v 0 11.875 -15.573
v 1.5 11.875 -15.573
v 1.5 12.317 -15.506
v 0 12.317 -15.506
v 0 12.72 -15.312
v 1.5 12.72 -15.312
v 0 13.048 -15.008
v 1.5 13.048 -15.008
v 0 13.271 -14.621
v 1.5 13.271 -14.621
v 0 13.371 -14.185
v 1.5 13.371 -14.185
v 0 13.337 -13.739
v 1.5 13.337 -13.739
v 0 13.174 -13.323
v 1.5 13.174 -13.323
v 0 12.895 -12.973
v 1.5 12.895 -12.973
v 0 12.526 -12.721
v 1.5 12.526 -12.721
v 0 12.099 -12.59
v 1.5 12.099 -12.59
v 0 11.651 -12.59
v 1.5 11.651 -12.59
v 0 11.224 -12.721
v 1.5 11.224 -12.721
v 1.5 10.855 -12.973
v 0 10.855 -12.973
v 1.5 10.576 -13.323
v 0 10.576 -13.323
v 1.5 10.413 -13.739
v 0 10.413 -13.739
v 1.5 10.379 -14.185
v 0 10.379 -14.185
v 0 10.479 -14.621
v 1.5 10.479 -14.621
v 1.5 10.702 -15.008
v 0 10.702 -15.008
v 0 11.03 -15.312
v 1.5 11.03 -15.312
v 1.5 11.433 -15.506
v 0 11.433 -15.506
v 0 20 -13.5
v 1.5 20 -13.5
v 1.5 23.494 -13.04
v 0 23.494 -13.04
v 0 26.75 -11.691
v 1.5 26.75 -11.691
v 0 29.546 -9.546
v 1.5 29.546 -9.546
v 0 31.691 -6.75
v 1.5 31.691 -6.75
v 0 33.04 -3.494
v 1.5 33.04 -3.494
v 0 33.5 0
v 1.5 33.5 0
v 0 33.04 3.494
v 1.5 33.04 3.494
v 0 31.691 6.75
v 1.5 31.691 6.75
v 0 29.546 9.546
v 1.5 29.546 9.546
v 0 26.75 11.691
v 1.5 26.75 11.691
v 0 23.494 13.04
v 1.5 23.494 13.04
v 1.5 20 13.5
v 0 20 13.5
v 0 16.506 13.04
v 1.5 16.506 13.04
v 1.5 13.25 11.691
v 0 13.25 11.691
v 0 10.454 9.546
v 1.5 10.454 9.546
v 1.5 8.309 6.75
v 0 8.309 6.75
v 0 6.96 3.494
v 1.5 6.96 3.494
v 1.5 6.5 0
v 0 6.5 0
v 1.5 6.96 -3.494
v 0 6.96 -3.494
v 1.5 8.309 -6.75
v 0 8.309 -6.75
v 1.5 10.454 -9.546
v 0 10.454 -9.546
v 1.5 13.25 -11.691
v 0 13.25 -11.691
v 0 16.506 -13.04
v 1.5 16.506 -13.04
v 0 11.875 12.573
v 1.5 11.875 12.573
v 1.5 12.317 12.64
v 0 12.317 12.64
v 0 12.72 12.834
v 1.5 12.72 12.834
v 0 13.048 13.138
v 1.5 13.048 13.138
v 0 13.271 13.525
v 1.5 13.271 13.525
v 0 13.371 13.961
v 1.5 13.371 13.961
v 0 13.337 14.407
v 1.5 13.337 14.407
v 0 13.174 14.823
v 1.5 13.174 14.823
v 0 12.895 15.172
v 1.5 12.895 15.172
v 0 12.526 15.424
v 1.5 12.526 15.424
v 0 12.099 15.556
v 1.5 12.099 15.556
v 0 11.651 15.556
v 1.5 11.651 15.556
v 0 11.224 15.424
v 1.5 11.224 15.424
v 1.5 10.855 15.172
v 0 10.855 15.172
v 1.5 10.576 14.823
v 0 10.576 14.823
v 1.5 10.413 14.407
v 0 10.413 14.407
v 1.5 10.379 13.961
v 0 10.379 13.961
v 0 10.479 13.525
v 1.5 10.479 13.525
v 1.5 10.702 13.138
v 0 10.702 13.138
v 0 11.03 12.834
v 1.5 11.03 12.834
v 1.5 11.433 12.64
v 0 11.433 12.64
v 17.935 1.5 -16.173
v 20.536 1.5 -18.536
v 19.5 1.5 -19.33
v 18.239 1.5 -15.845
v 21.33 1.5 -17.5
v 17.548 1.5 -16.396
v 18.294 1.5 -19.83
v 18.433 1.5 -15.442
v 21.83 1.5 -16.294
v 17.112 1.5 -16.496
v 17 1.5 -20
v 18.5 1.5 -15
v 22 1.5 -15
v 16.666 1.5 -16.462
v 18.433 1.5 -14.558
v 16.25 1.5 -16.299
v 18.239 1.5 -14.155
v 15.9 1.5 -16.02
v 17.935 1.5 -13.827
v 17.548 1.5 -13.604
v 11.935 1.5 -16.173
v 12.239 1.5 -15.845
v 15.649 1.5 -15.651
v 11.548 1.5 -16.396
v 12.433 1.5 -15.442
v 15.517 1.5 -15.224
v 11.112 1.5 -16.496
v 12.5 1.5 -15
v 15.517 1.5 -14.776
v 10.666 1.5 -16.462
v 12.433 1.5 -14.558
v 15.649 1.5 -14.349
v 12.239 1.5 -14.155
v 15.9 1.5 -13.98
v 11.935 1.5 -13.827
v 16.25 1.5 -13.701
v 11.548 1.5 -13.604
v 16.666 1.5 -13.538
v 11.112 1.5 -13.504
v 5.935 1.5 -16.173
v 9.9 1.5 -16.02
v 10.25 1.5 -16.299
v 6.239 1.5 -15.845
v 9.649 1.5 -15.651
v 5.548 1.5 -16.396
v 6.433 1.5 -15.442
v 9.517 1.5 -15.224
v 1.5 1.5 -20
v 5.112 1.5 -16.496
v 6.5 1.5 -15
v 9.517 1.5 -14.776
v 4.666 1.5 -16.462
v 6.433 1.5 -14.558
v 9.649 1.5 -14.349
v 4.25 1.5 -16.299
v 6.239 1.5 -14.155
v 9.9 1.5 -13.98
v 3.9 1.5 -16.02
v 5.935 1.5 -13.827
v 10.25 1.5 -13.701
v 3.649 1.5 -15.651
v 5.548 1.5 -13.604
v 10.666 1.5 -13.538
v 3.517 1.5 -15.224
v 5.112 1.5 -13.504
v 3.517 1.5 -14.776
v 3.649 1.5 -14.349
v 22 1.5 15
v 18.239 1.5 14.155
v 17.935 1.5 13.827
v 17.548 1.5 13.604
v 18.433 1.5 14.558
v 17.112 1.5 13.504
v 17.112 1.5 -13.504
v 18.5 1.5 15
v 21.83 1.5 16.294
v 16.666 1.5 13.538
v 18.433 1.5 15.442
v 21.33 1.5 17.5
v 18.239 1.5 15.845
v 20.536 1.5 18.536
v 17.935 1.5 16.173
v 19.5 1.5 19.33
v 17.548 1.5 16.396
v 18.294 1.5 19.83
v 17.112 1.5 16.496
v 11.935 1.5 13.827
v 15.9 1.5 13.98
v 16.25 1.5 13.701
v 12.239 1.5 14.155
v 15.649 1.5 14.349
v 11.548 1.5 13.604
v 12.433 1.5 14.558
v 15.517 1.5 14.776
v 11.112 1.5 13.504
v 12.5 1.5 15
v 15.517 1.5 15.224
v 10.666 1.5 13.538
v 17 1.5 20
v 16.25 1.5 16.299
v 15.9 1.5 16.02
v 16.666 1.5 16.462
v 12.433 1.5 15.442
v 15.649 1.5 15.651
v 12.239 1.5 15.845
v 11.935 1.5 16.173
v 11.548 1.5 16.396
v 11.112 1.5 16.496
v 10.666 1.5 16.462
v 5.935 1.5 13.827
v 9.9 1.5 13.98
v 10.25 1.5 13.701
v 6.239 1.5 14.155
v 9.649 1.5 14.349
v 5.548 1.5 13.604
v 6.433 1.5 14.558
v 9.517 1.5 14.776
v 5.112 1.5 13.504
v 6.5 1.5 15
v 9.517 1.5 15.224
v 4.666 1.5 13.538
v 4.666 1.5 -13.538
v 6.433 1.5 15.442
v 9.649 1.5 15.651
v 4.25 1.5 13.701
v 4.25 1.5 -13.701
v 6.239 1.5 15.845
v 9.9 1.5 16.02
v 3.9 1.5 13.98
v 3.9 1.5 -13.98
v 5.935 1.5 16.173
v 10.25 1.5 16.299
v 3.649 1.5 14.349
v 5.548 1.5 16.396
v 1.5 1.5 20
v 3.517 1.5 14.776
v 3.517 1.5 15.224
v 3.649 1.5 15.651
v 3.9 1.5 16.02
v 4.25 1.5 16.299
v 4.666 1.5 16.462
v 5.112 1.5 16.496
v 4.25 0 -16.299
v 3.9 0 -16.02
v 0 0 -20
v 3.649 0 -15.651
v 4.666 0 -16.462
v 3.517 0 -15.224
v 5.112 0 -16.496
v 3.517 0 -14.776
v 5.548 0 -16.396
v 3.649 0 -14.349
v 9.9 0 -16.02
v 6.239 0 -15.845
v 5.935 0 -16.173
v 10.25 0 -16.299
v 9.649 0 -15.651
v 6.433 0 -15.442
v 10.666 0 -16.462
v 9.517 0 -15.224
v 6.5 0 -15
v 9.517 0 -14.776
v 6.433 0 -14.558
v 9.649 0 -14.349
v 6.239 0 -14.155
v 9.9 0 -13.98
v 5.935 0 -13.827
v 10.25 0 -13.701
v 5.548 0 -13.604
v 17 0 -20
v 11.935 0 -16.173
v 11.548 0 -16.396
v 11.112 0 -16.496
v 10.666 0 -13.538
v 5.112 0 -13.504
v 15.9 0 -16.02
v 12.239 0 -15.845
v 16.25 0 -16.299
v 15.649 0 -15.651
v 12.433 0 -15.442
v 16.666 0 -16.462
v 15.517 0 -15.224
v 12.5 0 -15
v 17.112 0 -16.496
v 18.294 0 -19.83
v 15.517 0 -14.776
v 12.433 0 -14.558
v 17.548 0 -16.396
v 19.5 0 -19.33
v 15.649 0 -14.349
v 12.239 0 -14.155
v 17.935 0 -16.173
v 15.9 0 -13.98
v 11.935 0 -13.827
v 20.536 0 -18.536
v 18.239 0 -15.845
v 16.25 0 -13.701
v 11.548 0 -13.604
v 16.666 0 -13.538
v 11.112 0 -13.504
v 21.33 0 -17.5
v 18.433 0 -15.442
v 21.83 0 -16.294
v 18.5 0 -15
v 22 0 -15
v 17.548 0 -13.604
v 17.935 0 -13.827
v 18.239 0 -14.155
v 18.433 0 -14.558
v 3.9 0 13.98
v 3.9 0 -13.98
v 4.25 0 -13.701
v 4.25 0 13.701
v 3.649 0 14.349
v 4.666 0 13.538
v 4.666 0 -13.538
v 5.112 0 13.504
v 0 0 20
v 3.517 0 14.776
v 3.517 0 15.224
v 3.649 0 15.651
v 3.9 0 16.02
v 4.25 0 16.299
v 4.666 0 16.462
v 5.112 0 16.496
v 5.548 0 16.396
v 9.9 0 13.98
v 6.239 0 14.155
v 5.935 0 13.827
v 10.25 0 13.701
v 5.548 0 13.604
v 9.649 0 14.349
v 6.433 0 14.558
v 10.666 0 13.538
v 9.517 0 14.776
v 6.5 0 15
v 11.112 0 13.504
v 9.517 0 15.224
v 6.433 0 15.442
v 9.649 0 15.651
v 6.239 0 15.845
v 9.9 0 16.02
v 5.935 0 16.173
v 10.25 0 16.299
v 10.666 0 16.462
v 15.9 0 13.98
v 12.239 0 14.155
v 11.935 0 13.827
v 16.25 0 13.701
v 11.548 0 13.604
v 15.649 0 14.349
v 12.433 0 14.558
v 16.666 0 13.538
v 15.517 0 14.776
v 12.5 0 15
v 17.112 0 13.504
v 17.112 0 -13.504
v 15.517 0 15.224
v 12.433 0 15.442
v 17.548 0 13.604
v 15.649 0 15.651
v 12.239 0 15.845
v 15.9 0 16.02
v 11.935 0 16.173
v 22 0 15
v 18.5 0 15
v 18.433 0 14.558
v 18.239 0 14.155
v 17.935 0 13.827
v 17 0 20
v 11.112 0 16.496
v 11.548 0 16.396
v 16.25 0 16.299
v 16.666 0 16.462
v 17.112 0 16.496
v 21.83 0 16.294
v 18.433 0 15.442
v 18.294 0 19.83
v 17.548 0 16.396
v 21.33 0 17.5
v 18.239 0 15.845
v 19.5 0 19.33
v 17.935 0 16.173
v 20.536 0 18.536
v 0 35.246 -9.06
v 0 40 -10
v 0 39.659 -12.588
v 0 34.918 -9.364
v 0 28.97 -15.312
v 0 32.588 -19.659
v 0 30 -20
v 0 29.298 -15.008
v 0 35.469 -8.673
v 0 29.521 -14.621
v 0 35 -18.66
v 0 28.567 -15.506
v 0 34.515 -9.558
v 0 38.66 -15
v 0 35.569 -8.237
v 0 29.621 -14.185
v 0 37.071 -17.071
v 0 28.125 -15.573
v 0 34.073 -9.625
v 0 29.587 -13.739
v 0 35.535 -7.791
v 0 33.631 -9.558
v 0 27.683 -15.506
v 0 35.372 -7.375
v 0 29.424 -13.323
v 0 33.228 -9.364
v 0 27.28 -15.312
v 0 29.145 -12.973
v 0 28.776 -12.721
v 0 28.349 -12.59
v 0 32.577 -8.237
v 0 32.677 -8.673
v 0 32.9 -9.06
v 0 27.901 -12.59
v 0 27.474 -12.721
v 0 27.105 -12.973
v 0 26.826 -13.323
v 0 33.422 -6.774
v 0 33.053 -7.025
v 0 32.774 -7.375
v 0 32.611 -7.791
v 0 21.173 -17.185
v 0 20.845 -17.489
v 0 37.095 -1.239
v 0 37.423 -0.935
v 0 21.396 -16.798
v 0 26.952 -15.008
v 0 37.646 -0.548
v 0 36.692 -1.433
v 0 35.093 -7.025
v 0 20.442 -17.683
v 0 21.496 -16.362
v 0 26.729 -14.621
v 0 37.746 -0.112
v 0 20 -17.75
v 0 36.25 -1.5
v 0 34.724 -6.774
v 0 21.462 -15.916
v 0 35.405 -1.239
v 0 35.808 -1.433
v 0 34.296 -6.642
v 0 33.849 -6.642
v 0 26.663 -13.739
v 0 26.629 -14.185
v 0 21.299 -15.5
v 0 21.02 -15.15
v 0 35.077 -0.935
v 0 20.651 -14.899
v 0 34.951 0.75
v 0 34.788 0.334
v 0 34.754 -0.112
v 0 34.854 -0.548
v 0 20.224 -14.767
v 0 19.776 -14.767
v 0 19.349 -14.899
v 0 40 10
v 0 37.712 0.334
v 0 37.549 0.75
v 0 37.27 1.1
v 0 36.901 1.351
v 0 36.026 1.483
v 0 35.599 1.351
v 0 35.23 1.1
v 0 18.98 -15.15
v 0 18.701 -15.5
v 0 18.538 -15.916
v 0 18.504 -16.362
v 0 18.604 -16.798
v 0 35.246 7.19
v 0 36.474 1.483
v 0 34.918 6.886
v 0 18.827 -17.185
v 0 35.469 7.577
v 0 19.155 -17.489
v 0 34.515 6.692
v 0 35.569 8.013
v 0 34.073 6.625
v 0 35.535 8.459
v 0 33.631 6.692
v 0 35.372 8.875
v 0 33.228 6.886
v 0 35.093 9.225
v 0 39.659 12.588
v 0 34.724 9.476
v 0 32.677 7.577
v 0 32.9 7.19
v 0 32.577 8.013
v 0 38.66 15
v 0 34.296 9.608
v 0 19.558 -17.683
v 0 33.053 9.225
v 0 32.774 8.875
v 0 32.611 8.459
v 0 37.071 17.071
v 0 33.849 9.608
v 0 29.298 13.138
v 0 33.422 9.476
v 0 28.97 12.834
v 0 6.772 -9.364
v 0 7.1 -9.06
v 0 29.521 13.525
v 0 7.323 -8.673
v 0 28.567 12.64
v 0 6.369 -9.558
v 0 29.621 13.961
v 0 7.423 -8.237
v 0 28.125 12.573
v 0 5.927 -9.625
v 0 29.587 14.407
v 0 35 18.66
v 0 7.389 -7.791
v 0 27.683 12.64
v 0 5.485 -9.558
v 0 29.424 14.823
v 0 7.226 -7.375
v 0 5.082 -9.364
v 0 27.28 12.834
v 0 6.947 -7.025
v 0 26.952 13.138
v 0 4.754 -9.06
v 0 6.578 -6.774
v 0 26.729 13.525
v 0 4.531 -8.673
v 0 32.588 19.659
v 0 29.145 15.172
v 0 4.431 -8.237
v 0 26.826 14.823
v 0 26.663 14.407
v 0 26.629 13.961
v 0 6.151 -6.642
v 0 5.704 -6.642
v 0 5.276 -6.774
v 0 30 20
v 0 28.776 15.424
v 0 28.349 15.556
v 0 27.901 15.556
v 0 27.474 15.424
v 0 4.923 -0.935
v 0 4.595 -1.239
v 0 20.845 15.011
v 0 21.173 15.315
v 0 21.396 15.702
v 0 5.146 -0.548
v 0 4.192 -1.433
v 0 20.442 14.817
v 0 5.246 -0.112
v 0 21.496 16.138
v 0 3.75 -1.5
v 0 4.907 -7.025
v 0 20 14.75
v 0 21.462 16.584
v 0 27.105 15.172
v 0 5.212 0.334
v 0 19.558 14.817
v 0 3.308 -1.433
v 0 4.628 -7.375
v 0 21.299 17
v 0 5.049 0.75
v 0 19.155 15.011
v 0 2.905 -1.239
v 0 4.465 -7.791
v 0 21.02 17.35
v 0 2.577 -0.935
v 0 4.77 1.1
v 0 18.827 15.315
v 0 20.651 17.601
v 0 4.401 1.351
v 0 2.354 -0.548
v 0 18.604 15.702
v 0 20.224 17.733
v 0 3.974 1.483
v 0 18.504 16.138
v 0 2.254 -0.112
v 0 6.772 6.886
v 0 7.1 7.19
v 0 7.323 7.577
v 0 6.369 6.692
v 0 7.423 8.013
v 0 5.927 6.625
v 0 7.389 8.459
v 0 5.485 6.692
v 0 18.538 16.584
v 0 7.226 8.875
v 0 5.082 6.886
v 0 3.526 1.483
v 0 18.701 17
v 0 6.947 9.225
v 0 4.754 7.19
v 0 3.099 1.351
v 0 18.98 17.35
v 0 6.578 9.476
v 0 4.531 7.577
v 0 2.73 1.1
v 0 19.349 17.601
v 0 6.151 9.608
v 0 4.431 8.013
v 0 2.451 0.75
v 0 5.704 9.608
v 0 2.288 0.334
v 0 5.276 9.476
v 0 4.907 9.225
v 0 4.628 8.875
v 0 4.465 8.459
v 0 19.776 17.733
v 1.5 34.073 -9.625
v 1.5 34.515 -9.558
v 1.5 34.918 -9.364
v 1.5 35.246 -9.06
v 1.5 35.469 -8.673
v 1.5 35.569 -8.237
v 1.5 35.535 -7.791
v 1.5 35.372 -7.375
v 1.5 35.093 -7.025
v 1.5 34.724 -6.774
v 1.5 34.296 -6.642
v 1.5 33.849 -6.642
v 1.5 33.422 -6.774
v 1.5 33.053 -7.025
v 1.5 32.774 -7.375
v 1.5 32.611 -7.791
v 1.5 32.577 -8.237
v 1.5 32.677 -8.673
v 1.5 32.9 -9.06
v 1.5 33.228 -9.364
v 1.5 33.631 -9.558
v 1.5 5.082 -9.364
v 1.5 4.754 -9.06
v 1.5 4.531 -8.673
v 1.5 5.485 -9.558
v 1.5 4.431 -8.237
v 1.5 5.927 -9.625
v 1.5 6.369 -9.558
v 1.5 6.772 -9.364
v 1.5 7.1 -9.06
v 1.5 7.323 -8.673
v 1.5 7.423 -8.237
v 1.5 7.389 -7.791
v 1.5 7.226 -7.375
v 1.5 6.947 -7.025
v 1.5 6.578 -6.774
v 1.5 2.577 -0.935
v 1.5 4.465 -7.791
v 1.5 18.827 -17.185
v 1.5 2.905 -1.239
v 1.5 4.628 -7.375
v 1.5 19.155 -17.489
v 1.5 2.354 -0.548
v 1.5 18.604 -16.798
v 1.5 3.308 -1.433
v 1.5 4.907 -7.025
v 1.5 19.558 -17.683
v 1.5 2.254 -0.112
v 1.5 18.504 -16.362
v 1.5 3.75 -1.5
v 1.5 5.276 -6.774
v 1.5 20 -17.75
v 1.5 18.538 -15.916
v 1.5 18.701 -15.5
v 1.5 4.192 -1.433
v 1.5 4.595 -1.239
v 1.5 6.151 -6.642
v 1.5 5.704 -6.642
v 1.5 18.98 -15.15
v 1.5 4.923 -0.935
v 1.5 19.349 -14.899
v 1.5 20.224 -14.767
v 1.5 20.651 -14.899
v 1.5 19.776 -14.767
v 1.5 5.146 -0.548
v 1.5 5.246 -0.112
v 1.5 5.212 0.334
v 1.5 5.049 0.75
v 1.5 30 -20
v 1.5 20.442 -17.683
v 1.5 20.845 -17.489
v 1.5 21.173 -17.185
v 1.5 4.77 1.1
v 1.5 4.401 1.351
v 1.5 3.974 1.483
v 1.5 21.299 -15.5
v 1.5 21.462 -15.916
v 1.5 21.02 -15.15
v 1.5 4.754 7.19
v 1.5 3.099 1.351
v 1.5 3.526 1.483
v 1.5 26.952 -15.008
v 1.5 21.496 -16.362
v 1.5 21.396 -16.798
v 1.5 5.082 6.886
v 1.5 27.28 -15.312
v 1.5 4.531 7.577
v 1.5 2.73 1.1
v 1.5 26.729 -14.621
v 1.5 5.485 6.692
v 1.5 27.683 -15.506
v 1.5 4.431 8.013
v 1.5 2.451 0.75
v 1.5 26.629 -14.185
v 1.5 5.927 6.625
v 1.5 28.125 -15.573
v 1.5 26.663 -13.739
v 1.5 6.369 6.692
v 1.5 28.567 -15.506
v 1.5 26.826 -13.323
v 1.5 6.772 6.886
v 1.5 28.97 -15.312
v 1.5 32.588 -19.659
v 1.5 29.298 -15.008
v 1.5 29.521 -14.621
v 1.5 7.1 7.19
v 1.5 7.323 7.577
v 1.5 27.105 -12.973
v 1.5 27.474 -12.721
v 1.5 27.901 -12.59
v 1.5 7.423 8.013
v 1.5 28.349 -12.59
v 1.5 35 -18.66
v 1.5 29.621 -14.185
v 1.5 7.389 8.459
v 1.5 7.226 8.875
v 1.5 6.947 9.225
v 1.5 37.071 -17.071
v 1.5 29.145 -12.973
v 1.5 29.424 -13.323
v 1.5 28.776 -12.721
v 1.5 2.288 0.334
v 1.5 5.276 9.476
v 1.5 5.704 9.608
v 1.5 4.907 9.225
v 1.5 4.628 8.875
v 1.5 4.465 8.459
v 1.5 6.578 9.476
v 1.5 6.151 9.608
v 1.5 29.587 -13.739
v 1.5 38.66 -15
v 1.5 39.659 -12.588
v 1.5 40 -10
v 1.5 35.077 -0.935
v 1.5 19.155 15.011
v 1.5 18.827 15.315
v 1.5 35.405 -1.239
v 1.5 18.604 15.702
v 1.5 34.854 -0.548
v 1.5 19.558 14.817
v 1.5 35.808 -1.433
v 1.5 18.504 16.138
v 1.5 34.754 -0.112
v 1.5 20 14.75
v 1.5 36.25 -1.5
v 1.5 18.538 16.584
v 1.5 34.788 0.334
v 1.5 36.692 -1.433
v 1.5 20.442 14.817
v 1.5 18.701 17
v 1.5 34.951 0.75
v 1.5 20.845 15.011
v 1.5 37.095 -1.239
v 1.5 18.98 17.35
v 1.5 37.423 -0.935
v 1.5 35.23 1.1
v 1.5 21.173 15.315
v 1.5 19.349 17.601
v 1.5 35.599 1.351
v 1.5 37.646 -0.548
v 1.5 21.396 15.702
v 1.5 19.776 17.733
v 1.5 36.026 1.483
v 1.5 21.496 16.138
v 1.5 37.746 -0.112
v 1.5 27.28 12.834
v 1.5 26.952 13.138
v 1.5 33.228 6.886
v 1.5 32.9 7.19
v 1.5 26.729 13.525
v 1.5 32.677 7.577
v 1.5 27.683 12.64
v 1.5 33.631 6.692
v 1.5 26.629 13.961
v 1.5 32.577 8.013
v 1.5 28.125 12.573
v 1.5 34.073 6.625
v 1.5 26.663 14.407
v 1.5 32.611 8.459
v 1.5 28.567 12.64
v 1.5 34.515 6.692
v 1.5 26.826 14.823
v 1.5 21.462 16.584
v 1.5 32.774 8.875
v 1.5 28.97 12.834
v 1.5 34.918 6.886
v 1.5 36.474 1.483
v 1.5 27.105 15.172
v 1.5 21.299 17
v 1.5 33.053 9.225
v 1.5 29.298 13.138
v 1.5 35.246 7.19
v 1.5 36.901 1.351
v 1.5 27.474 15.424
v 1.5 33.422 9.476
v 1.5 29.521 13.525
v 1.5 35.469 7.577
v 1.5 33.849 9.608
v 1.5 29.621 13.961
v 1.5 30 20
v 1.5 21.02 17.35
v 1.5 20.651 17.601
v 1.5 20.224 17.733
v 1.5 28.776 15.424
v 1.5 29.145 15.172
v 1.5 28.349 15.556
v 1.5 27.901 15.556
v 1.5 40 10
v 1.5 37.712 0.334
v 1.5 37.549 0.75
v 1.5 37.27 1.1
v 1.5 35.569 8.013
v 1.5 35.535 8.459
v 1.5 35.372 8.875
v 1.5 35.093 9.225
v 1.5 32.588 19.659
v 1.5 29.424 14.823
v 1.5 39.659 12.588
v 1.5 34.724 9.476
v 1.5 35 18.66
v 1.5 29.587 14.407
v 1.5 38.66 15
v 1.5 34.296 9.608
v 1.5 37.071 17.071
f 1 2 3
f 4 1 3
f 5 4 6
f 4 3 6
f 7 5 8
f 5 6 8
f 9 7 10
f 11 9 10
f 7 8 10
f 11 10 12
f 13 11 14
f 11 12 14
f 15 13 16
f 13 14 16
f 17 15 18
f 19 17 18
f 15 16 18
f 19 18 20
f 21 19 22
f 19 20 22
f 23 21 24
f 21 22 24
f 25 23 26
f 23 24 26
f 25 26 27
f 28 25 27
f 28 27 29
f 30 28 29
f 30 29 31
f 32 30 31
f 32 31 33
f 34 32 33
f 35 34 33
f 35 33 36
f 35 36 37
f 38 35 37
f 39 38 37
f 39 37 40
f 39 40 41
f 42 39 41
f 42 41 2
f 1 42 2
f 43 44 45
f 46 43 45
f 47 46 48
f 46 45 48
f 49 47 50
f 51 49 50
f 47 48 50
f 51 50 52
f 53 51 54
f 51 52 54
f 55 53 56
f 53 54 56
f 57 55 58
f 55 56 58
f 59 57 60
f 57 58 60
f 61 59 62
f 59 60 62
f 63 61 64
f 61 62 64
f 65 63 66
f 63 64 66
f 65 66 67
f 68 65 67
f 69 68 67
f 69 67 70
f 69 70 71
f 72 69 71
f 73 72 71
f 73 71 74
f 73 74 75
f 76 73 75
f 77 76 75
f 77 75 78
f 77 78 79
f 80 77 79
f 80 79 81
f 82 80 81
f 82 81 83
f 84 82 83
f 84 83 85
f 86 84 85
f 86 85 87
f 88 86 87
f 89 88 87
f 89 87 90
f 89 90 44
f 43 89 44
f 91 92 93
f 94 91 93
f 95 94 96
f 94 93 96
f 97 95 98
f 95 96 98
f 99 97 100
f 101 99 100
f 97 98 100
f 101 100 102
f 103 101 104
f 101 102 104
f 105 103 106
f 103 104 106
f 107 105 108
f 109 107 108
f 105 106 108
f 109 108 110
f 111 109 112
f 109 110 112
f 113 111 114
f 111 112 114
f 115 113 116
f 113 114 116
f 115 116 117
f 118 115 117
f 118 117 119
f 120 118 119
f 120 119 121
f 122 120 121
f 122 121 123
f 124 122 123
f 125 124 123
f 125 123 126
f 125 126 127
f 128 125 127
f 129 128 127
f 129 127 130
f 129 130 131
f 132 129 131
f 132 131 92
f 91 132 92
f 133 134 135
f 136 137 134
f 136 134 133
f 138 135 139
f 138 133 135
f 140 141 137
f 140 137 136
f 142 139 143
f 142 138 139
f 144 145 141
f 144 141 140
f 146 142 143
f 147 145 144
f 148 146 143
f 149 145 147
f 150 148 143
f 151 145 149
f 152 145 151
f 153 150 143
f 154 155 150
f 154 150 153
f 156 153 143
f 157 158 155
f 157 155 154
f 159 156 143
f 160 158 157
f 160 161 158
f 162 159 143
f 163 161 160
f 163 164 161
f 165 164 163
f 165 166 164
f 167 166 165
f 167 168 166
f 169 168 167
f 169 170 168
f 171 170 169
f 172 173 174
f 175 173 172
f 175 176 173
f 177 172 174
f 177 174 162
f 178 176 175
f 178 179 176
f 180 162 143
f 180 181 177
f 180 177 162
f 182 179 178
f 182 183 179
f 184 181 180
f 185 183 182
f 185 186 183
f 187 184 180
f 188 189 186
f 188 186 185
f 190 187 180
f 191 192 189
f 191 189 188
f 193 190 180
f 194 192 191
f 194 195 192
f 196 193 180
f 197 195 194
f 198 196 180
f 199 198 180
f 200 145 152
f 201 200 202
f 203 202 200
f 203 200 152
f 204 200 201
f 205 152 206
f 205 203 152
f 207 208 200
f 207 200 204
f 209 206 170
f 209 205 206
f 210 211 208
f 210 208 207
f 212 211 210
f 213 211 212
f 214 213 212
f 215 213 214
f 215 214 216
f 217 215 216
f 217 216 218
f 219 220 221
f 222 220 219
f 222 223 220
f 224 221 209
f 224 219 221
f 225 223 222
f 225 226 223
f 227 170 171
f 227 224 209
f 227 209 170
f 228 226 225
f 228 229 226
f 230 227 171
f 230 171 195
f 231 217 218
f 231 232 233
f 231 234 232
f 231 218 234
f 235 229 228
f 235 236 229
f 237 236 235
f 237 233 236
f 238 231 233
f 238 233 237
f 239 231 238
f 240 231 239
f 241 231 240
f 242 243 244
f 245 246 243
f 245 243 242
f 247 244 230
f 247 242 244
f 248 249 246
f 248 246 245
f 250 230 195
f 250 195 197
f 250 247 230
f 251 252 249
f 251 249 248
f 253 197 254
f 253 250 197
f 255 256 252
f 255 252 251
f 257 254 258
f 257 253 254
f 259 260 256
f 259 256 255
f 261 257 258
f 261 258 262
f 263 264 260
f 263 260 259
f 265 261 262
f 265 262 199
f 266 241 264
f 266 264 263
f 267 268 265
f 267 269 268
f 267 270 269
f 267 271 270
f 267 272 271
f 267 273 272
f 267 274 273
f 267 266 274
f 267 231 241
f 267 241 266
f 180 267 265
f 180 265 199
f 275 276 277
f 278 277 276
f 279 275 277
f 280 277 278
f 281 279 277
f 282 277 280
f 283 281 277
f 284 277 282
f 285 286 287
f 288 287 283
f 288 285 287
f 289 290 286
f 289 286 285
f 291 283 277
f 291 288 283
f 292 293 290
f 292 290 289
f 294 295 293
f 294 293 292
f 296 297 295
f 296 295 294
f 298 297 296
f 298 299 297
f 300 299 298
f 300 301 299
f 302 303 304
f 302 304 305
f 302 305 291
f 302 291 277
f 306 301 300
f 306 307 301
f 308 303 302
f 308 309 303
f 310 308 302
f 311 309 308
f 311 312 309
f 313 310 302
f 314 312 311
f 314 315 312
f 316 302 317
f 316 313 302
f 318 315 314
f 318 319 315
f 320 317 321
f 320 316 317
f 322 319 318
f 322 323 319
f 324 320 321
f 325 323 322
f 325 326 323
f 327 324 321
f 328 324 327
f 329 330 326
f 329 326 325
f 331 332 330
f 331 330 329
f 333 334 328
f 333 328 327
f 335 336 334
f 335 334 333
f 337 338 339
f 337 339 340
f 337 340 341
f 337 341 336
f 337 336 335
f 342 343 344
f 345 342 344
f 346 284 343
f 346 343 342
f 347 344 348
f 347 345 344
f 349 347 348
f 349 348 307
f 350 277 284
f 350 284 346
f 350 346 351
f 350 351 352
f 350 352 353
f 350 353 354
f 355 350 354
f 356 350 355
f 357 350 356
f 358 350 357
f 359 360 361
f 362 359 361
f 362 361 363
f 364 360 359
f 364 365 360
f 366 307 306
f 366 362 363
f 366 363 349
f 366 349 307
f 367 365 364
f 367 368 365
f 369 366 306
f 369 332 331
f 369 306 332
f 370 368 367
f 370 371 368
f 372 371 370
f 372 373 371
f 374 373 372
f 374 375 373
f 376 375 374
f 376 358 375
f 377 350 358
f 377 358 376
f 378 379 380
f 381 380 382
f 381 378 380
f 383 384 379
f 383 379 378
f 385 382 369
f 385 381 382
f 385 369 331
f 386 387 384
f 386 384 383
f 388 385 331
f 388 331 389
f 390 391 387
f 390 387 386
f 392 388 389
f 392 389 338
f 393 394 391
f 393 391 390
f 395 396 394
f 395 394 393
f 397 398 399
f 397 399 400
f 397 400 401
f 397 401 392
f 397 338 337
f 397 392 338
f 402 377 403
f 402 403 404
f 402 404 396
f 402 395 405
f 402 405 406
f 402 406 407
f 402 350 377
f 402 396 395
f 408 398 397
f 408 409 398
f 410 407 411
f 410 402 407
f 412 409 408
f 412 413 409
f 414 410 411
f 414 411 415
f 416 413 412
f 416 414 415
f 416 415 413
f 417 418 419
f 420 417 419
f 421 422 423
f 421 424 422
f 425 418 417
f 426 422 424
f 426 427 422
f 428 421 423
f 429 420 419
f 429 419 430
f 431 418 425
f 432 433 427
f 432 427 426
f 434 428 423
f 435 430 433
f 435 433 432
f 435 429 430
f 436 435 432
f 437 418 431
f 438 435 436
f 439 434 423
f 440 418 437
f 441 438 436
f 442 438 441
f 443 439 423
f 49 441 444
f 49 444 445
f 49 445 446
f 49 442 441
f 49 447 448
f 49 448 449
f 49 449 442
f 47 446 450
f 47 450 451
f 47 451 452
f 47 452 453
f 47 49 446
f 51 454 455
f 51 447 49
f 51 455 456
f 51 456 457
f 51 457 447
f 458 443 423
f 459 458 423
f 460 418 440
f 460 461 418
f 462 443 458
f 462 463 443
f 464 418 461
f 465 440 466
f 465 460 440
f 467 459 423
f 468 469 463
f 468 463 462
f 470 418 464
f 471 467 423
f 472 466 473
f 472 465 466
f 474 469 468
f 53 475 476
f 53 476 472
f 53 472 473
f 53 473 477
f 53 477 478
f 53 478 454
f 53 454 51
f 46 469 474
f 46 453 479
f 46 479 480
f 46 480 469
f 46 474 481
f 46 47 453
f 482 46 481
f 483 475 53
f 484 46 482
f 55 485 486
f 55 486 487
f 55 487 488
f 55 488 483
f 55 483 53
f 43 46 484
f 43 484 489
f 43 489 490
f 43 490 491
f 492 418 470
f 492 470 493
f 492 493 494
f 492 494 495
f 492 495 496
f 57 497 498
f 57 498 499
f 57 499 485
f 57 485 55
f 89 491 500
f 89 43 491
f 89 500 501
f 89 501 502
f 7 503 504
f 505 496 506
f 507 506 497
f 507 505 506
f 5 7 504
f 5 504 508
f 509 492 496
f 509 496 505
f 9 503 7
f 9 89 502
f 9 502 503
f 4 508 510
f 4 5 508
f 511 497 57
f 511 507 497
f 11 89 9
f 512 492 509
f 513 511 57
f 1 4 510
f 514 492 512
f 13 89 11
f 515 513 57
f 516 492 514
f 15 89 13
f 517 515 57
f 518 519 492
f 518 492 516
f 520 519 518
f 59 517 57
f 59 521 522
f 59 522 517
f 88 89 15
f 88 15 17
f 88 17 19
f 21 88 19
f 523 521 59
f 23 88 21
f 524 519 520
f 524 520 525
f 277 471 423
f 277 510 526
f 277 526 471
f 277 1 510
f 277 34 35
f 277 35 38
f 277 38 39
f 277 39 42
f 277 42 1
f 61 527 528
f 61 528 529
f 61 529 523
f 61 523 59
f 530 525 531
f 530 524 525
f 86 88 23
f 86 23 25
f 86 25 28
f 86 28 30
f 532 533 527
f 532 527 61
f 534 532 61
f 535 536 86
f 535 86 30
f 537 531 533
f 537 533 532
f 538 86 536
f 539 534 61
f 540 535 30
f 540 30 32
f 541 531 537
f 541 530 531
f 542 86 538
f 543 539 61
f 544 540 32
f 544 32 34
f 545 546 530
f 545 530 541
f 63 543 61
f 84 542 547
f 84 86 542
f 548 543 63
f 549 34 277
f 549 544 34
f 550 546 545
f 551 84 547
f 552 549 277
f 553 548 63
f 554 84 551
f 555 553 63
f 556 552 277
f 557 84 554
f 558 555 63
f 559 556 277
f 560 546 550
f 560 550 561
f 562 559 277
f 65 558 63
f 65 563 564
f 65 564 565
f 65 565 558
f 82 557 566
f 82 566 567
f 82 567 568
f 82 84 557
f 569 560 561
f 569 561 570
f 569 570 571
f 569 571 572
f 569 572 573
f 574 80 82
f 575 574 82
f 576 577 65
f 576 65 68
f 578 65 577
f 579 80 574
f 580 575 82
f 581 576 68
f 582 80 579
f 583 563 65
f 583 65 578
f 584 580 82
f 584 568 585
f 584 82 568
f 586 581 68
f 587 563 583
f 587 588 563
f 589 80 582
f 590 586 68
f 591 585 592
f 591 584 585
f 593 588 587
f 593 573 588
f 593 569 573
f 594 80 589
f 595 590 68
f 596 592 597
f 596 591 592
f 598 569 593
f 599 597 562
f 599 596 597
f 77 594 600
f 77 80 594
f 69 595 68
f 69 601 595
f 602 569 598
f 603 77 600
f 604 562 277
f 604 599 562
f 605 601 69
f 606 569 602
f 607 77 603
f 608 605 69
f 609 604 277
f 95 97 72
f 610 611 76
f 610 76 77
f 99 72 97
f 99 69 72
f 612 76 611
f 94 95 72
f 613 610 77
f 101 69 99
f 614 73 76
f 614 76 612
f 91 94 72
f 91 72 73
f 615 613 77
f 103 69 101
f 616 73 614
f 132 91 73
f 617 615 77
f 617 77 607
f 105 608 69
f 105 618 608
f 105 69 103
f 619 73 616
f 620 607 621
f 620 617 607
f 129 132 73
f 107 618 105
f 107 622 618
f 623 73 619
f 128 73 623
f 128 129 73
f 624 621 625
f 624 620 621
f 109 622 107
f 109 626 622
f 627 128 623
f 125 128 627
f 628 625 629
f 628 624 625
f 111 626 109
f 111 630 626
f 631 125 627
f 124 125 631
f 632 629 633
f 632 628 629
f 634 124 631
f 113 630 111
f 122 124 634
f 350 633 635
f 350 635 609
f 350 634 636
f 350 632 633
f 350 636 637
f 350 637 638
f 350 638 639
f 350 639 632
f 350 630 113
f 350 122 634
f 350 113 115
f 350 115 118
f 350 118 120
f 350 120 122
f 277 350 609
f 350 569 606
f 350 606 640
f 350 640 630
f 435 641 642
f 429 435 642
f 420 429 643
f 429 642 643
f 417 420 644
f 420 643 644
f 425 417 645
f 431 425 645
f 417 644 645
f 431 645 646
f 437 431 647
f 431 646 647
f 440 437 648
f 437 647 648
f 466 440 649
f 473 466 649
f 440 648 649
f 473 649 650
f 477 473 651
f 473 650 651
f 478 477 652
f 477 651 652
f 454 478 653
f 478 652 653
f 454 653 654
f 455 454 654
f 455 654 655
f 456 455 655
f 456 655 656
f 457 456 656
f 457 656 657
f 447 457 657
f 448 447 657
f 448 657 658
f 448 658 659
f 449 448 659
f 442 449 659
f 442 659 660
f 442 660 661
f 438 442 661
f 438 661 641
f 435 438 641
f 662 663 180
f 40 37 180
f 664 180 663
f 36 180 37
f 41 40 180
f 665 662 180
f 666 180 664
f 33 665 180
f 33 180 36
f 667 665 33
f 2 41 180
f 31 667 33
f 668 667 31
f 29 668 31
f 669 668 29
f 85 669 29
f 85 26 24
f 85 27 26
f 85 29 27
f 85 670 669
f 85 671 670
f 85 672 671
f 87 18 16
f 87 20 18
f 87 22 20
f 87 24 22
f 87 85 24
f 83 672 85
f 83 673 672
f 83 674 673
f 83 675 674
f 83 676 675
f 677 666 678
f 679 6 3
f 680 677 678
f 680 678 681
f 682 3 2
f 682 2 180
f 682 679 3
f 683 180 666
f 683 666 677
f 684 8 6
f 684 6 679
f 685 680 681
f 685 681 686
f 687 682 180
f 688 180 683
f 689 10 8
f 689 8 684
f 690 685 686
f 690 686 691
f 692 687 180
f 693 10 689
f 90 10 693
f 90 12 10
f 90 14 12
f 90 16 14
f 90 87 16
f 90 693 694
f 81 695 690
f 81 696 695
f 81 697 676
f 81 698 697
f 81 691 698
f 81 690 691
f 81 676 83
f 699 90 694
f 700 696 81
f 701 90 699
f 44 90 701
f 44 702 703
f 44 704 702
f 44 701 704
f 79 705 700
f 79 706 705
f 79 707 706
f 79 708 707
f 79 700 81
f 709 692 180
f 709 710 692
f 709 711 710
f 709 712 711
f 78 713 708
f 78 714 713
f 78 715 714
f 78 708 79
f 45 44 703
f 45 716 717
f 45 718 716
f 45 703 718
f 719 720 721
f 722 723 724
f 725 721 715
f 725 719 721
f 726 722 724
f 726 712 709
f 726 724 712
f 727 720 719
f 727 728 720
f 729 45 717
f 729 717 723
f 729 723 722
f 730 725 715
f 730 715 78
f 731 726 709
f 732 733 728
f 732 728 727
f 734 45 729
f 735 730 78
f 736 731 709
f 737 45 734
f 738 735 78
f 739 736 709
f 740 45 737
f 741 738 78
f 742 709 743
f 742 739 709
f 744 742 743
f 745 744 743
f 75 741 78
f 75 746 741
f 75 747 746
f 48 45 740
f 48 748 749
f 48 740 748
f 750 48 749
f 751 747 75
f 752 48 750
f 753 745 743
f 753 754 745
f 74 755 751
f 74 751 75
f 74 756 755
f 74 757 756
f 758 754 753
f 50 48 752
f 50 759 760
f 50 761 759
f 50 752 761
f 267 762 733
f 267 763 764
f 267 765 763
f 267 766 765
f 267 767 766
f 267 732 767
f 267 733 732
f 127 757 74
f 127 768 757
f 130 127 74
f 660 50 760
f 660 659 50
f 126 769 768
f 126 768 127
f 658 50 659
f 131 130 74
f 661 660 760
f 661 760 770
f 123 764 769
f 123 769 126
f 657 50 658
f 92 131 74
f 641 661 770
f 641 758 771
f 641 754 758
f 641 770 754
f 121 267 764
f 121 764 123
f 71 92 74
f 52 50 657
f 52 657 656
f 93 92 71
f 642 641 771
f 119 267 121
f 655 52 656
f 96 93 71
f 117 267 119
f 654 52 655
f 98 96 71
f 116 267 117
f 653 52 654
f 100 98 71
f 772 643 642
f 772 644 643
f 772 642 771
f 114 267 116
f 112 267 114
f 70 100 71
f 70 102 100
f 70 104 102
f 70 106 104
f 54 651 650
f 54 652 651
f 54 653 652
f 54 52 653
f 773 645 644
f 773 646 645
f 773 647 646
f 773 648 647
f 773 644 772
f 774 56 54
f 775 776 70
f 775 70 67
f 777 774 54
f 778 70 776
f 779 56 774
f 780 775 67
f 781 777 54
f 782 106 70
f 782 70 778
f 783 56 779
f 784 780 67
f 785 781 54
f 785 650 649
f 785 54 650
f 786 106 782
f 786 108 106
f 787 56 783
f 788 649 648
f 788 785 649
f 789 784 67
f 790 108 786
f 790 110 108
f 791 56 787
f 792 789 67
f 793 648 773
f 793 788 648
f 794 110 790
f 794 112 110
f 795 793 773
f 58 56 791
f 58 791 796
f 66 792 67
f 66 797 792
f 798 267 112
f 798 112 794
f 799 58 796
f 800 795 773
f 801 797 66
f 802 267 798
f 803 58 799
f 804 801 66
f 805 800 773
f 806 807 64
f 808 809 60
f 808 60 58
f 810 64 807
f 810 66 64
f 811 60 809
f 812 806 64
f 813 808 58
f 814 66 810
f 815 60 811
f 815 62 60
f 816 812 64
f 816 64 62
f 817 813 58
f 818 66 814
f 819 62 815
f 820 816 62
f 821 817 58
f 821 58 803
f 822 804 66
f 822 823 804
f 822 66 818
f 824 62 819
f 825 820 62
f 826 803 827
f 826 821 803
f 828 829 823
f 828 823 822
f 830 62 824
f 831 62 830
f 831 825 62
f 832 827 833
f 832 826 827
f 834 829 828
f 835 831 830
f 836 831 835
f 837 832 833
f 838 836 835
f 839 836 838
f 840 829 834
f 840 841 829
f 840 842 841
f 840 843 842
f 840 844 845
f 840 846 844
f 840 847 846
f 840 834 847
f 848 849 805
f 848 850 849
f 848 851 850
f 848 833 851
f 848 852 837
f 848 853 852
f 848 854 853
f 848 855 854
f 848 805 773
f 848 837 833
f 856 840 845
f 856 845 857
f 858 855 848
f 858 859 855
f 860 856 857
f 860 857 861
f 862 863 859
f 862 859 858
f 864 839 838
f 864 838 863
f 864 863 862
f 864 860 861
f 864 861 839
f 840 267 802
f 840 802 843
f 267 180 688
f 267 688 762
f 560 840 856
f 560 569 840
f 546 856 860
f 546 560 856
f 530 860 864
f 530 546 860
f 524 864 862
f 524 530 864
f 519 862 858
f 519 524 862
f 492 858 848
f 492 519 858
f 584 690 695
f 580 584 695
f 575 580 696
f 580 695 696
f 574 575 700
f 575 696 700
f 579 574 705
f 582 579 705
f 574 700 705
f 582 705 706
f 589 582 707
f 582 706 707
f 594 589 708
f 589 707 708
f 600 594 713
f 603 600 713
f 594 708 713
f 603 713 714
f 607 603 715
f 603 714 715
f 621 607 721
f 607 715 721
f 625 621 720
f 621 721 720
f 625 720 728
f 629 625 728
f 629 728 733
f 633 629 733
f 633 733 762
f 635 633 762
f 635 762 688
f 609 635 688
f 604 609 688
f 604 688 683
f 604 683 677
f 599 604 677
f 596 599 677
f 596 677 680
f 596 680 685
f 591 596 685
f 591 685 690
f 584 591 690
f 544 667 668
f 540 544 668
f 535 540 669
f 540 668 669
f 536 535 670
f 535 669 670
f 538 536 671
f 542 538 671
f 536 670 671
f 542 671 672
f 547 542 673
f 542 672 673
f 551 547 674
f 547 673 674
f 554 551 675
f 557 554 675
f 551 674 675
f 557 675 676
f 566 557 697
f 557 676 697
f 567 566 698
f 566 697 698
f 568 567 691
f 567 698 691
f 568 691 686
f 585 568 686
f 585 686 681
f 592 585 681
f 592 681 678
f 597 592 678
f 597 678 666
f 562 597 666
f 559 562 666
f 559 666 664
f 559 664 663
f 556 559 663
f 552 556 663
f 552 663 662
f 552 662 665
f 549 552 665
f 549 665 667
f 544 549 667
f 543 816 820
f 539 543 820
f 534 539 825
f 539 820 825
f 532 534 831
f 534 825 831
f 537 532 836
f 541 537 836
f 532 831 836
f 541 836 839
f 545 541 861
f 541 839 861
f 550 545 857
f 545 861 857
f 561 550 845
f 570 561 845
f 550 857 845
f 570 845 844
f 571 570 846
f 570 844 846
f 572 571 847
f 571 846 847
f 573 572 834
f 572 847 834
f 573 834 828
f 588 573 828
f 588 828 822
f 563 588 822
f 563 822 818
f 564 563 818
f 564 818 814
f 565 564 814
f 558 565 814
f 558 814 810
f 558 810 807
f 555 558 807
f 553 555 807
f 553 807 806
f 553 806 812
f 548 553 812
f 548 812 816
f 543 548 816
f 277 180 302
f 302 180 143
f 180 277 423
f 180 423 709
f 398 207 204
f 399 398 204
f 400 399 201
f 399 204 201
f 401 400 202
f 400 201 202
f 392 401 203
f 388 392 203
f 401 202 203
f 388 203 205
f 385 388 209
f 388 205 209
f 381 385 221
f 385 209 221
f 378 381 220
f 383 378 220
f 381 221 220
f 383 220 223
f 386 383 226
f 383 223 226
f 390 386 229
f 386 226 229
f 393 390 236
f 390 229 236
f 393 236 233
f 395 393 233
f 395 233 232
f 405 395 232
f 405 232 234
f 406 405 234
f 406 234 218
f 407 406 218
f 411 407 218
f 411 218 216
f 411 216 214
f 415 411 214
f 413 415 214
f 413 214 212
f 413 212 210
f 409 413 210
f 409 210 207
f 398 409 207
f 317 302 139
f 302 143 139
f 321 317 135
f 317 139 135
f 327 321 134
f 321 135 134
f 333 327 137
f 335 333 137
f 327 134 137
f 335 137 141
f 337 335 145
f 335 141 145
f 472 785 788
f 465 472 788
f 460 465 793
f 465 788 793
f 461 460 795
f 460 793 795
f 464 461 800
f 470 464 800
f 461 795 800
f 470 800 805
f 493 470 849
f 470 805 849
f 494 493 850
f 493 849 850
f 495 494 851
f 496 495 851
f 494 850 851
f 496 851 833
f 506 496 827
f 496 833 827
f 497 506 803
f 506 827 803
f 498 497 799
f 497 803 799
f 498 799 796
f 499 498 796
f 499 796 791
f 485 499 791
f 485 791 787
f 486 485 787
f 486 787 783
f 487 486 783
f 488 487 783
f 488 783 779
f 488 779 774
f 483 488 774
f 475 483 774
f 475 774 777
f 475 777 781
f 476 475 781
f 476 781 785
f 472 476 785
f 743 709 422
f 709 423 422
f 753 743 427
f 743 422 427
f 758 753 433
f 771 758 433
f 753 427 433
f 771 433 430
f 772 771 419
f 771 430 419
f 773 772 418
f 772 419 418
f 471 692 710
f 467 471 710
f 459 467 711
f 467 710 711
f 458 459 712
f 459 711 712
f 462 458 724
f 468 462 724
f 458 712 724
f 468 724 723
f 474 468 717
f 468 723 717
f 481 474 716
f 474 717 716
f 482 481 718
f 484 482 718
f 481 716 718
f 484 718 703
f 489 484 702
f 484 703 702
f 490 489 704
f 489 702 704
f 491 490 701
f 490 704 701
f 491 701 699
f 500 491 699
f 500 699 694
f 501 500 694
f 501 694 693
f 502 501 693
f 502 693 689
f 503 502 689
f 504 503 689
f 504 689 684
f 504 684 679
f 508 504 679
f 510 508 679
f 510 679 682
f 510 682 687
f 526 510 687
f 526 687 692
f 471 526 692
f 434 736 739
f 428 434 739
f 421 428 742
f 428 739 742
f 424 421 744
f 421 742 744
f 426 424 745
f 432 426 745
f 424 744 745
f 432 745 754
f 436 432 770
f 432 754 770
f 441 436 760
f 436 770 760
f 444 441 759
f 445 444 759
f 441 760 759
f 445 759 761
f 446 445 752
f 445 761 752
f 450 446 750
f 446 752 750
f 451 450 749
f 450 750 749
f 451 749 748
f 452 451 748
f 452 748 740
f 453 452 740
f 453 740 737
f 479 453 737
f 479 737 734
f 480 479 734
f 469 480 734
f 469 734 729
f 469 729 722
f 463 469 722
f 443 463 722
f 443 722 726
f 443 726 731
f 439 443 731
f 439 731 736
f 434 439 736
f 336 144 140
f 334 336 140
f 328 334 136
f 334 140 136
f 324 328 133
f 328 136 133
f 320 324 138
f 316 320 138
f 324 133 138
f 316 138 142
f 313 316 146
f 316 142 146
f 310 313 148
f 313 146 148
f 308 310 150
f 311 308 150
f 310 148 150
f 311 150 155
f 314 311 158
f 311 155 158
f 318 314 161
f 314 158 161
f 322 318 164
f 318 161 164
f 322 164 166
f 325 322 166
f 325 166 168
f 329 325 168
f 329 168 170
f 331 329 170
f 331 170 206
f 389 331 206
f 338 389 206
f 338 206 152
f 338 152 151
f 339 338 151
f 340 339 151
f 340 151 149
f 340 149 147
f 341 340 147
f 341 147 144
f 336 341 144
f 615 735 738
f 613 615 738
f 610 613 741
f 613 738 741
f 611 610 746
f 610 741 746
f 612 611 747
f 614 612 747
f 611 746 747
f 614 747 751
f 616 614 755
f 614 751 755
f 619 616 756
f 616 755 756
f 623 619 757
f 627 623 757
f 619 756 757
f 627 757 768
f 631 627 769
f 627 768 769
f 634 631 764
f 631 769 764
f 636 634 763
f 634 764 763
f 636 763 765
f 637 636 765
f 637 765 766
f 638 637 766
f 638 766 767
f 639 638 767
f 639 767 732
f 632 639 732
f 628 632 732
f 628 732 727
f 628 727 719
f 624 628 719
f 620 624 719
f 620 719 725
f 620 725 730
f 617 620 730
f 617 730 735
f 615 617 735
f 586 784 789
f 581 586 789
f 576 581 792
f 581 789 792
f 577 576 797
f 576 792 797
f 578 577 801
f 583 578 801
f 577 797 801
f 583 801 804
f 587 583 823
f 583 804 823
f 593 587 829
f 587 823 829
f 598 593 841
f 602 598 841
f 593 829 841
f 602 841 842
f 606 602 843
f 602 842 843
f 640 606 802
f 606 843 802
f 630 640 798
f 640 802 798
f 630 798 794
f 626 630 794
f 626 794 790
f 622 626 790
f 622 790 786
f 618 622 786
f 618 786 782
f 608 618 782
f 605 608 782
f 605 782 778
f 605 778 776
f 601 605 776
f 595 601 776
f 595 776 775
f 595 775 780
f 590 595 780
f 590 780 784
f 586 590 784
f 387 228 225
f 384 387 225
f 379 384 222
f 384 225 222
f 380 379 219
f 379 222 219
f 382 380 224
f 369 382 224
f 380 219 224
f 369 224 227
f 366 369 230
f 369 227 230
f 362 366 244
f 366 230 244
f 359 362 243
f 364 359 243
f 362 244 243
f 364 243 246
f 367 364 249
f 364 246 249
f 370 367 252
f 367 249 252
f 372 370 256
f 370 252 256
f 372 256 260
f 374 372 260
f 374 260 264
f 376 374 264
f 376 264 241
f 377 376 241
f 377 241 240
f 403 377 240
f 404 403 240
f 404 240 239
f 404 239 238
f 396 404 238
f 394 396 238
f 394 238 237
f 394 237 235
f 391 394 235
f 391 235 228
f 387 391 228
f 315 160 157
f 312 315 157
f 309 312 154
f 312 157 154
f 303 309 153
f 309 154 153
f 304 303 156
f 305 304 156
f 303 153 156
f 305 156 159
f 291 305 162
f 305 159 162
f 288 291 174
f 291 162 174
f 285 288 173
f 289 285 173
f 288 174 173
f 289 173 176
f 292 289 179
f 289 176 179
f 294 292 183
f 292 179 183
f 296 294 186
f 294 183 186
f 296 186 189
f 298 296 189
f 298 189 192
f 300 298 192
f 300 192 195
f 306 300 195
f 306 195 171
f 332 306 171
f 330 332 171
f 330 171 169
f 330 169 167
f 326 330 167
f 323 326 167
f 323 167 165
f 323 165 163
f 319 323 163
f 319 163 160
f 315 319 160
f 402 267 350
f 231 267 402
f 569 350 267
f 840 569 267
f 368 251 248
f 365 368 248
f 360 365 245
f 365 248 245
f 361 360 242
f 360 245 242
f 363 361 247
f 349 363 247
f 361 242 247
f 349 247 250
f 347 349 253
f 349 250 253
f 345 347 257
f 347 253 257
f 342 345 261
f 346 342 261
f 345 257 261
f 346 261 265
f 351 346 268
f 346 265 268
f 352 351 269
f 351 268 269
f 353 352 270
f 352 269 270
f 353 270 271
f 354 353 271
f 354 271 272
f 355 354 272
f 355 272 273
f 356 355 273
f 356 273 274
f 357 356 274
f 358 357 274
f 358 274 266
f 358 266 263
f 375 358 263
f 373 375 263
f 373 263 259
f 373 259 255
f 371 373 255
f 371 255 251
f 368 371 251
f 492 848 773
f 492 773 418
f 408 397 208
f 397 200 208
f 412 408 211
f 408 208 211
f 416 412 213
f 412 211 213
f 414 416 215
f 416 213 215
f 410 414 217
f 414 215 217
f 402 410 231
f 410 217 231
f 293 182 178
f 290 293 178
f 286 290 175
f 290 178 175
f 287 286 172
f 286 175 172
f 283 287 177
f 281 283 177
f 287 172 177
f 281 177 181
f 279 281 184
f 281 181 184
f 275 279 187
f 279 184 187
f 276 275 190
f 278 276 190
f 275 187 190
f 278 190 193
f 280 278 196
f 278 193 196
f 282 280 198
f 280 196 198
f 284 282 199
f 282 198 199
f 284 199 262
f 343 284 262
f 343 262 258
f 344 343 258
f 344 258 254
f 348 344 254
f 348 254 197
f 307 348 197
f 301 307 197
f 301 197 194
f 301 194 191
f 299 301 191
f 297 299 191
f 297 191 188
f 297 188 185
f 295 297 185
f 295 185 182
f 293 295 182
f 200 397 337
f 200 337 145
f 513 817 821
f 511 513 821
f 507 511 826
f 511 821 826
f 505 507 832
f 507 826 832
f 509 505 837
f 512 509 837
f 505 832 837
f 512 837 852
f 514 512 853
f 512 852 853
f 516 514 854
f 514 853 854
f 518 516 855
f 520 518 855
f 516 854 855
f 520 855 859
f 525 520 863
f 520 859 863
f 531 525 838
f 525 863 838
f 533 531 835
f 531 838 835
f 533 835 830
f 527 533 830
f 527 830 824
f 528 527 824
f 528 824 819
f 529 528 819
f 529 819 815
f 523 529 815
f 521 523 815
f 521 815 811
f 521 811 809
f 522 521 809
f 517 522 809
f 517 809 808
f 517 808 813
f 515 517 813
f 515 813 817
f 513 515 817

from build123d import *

# Parameters (mm, degrees)
BOSS_EXTRUDE1_DEPTH = 20
SKETCH2_R           = 13.5
CUT_EXTRUDE1_DEPTH  = 40
SKETCH4_R           = 1.5
CUT_EXTRUDE2_DEPTH  = 40
SKETCH5_R           = 1.5
CUT_EXTRUDE3_DEPTH  = 40
FILLET1_R           = 10
FILLET2_R           = 5


with BuildPart() as part:
    # Sketch1 → Boss-Extrude1 (new body, symmetric)
    with BuildSketch(Plane.XY):
        Polygon((0, 0), (22, 0), (22, 1.5), (1.5, 1.5), (1.5, 40), (0, 40), align=None)
    extrude(amount=BOSS_EXTRUDE1_DEPTH, both=True)

    # Sketch2 → Cut-Extrude1 (cut)
    with BuildSketch(Plane(origin=(1.5, 0, 0), x_dir=(0, 0, -1), z_dir=(1, 0, 0))):
        with Locations((0, 20)):
            Circle(SKETCH2_R)
    extrude(amount=-CUT_EXTRUDE1_DEPTH, mode=Mode.SUBTRACT)

    # Sketch4 → Cut-Extrude2 (cut)
    with BuildSketch(Plane(origin=(1.5, 0, 0), x_dir=(0, 0, -1), z_dir=(1, 0, 0))):
        with Locations((16.25, 20)):
            Circle(SKETCH4_R)
        with Locations((14.072912811, 11.875)):
            Circle(SKETCH4_R)
        with Locations((8.125, 5.927087189)):
            Circle(SKETCH4_R)
        with Locations((0, 3.75)):
            Circle(SKETCH4_R)
        with Locations((-8.125, 5.927087189)):
            Circle(SKETCH4_R)
        with Locations((-14.072912811, 11.875)):
            Circle(SKETCH4_R)
        with Locations((-16.25, 20)):
            Circle(SKETCH4_R)
        with Locations((-14.072912811, 28.125)):
            Circle(SKETCH4_R)
        with Locations((-8.125, 34.072912811)):
            Circle(SKETCH4_R)
        with Locations((0, 36.25)):
            Circle(SKETCH4_R)
        with Locations((8.125, 34.072912811)):
            Circle(SKETCH4_R)
        with Locations((14.072912811, 28.125)):
            Circle(SKETCH4_R)
    extrude(amount=-CUT_EXTRUDE2_DEPTH, mode=Mode.SUBTRACT)

    # Sketch5 → Cut-Extrude3 (cut)
    with BuildSketch(Plane(origin=(0, 1.5, 0), x_dir=(1, 0, 0), z_dir=(0, 1, 0))):
        with Locations((5, 15)):
            Circle(SKETCH5_R)
        with Locations((11, 15)):
            Circle(SKETCH5_R)
        with Locations((17, 15)):
            Circle(SKETCH5_R)
        with Locations((17, -15)):
            Circle(SKETCH5_R)
        with Locations((11, -15)):
            Circle(SKETCH5_R)
        with Locations((5, -15)):
            Circle(SKETCH5_R)
    extrude(amount=-CUT_EXTRUDE3_DEPTH, mode=Mode.SUBTRACT)

    # Fillet1
    fillet1_edges = [part.edges().sort_by_distance(p)[0] for p in [
        (0.75, 40, 20),
        (0.75, 40, -20),
    ]]
    fillet(fillet1_edges, radius=FILLET1_R)

    # Fillet2
    fillet2_edges = [part.edges().sort_by_distance(p)[0] for p in [
        (22, 0.75, 20),
        (22, 0.75, -20),
    ]]
    fillet(fillet2_edges, radius=FILLET2_R)


solid = part.part
